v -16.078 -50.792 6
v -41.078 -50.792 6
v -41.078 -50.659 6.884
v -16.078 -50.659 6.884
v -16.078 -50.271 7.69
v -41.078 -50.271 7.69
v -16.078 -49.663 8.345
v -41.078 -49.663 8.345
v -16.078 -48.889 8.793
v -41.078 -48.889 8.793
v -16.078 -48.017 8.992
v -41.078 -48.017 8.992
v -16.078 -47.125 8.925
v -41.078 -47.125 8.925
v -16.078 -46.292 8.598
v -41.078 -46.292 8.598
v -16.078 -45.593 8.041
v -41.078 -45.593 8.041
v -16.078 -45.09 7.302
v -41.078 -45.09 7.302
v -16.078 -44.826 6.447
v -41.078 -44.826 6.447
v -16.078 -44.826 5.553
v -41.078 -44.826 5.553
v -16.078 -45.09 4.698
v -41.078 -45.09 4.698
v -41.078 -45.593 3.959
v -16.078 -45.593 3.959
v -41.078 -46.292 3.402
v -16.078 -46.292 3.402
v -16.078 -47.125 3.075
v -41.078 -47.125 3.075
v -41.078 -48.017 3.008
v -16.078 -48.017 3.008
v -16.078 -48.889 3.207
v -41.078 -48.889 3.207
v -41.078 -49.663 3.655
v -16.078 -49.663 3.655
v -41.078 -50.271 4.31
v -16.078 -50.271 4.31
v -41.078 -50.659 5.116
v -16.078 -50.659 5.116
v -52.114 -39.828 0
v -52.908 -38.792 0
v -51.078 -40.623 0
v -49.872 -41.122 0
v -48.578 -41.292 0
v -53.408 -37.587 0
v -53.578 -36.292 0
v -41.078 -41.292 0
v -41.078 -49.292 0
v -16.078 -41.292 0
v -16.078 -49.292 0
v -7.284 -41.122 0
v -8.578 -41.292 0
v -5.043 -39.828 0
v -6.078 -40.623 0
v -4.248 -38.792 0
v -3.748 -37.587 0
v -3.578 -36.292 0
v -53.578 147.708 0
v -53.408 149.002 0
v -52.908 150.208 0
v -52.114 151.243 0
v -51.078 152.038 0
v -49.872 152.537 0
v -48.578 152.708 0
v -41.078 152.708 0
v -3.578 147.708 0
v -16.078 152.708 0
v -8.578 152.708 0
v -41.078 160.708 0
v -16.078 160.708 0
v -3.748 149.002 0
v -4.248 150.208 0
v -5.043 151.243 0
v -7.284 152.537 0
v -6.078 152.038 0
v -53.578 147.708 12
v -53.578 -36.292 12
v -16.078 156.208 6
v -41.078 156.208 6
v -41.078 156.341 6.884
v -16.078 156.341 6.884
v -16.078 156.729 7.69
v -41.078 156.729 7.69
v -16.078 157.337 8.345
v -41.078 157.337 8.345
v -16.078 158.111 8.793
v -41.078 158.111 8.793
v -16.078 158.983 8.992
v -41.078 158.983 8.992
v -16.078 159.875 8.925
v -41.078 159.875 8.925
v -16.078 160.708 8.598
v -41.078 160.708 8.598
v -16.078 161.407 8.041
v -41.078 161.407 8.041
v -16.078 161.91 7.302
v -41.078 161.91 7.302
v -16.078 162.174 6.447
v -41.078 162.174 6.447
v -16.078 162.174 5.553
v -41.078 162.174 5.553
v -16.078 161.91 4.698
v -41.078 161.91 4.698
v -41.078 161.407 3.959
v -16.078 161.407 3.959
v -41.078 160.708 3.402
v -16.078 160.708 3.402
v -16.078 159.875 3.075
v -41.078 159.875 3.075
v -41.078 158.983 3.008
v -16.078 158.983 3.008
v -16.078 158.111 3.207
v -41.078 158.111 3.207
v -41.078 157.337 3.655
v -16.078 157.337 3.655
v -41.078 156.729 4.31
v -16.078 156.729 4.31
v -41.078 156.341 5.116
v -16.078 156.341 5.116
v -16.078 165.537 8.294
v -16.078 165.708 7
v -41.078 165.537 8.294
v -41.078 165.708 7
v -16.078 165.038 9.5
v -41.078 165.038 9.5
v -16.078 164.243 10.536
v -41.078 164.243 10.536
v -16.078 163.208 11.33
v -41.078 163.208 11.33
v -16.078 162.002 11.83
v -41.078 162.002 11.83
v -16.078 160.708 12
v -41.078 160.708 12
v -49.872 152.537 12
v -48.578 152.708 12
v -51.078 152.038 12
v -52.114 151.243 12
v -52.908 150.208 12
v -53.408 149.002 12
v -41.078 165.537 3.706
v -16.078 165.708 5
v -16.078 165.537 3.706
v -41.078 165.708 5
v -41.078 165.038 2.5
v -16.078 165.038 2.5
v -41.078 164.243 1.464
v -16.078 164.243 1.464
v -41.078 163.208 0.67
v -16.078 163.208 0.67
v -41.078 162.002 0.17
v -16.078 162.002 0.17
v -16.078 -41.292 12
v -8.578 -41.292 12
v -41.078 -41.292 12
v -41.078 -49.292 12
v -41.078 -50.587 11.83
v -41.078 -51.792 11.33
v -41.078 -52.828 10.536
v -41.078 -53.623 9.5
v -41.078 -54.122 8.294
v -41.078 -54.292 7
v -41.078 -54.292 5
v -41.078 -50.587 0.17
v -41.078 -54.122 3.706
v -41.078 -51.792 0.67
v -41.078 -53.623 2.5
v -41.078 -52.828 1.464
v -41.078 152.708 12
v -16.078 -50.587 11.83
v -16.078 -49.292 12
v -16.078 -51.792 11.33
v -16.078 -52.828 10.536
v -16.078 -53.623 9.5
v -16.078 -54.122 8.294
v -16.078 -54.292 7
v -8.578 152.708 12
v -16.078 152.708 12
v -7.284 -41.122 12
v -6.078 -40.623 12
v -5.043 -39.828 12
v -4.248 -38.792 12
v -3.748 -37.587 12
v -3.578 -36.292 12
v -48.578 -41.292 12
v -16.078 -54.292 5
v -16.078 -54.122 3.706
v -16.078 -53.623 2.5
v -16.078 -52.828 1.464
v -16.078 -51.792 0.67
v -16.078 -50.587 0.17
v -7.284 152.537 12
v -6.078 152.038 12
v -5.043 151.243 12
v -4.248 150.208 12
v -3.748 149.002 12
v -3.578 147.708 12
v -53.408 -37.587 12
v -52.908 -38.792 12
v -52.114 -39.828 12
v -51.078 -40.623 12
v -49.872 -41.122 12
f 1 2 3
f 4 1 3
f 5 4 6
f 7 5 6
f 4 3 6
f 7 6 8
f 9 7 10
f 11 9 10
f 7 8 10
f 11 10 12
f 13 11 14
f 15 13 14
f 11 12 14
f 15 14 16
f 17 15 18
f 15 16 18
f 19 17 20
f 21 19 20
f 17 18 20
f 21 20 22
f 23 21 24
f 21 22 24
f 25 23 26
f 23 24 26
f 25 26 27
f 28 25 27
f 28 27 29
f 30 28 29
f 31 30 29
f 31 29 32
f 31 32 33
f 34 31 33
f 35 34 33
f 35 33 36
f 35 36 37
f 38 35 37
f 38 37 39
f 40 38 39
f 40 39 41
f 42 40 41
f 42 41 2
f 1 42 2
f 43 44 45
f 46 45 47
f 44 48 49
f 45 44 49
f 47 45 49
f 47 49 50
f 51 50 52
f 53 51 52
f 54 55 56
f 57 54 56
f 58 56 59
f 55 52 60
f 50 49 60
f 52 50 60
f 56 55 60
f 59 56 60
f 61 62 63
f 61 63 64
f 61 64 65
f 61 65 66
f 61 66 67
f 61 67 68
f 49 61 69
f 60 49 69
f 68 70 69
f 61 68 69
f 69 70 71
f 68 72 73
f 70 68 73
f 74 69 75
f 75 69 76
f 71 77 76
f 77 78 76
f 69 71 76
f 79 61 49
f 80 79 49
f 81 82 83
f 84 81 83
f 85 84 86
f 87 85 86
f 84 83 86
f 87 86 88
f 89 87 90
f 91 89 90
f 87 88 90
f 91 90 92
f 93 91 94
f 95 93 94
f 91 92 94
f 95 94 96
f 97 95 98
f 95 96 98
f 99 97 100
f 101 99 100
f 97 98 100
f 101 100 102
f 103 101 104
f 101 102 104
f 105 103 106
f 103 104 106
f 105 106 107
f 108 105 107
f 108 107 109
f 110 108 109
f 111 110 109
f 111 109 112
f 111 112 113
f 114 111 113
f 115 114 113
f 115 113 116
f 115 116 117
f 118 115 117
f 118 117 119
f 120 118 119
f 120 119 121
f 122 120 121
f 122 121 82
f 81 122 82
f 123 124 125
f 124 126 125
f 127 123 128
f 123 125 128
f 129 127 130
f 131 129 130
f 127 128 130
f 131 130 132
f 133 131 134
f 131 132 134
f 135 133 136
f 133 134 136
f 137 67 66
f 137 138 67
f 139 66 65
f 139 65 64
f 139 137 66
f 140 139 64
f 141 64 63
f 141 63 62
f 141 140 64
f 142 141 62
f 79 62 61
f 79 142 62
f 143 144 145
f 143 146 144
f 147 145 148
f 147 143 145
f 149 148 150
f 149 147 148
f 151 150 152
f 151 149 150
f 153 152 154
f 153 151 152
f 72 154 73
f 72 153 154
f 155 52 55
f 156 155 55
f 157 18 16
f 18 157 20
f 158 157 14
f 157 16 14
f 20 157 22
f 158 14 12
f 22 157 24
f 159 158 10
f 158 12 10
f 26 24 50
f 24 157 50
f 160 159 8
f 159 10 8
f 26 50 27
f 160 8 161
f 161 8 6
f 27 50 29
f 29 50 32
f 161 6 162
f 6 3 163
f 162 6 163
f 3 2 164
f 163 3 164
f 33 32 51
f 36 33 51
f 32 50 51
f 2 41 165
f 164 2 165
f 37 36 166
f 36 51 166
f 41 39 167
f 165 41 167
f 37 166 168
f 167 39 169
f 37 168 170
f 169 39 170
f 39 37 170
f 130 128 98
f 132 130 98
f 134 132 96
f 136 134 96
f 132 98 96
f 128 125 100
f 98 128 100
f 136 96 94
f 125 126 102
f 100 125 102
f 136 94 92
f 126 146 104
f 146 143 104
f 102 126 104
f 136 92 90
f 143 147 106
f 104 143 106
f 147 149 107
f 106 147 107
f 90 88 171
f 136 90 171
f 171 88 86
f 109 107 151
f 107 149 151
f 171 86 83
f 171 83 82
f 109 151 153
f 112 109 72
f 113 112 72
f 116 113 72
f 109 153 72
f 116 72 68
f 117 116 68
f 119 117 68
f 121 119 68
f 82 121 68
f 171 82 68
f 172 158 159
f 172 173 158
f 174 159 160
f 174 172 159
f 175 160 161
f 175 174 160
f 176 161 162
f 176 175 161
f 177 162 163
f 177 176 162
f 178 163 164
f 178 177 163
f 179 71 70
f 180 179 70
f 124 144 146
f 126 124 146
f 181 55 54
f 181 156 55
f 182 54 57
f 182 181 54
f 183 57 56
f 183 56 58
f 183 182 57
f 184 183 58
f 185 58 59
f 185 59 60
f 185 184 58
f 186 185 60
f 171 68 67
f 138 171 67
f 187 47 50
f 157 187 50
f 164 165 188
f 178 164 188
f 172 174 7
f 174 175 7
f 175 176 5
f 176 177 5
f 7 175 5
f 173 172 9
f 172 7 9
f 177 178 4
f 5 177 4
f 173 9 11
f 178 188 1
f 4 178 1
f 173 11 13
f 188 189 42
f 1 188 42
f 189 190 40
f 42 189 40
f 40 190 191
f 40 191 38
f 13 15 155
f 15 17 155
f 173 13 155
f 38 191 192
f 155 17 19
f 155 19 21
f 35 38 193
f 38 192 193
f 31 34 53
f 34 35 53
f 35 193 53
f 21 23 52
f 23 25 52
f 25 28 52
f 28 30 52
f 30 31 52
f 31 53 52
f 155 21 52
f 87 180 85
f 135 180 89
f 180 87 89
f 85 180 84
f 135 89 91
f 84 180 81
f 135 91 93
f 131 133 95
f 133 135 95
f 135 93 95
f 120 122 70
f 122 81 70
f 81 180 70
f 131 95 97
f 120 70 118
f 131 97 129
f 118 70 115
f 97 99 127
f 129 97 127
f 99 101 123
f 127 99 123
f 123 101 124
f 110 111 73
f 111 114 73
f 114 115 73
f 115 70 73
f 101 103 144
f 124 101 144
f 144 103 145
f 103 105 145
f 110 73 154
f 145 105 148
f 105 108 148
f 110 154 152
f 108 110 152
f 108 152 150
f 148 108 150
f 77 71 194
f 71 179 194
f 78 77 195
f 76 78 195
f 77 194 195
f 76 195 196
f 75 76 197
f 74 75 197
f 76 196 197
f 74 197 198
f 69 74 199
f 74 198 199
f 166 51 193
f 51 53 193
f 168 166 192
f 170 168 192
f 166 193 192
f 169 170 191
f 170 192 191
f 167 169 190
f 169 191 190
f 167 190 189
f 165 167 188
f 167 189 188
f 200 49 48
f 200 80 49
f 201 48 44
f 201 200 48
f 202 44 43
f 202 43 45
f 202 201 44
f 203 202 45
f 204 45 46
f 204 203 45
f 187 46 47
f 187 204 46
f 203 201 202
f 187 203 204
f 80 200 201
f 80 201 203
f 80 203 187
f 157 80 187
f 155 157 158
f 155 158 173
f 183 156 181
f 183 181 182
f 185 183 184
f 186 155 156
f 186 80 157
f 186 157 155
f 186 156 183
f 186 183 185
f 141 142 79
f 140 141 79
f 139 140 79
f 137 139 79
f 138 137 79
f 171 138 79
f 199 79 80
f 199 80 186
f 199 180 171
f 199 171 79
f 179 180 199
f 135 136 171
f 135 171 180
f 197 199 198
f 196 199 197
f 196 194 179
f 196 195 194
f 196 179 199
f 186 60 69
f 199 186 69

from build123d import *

# Parameters (mm, degrees)
F1_DEPTH = 12
F2_R     = 3
F3_DEPTH = 37.501
F4_R     = 3
F5_DEPTH = 37.501
F6_R     = 5


with BuildPart() as f1:
    # F0 (on Top) → F1 (new body)
    with BuildSketch(Plane.XY):
        Polygon((-16.078127, 165.7075), (-41.078127, 165.7075), (-41.078127, 152.7075), (-53.578127, 152.7075), (-53.578127, -41.2925), (-41.078127, -41.2925), (-41.078127, -54.2925), (-16.078127, -54.2925), (-16.078127, -41.2925), (-3.578127, -41.2925), (-3.578127, 152.7075), (-16.078127, 152.7075), align=None)
    extrude(amount=F1_DEPTH)

    # F2 (on face) → F3 (cut, through all)
    with BuildSketch(Plane(origin=(-41.078127, 0, 0), x_dir=(0, -1, 0), z_dir=(-1, 0, 0))):
        with Locations((-159.2075, 6)):
            Circle(F2_R)
    extrude(amount=-F3_DEPTH, mode=Mode.SUBTRACT)

    # F4 (on face) → F5 (cut, through all)
    with BuildSketch(Plane(origin=(-41.078127, 0, 0), x_dir=(0, -1, 0), z_dir=(-1, 0, 0))):
        with Locations((47.7925, 6)):
            Circle(F4_R)
    extrude(amount=-F5_DEPTH, mode=Mode.SUBTRACT)

    # F6
    f6_edges = [f1.edges().sort_by_distance(p)[0] for p in [
        (-28.578127, -54.2925, 12),
        (-28.578127, -54.2925, 0),
        (-28.578127, 165.7075, 12),
        (-28.578127, 165.7075, 0),
        (-3.578127, 152.7075, 6),
        (-53.578127, 152.7075, 6),
        (-53.578127, -41.2925, 6),
        (-3.578127, -41.2925, 6),
    ]]
    fillet(f6_edges, radius=F6_R)


solid = f1.part
